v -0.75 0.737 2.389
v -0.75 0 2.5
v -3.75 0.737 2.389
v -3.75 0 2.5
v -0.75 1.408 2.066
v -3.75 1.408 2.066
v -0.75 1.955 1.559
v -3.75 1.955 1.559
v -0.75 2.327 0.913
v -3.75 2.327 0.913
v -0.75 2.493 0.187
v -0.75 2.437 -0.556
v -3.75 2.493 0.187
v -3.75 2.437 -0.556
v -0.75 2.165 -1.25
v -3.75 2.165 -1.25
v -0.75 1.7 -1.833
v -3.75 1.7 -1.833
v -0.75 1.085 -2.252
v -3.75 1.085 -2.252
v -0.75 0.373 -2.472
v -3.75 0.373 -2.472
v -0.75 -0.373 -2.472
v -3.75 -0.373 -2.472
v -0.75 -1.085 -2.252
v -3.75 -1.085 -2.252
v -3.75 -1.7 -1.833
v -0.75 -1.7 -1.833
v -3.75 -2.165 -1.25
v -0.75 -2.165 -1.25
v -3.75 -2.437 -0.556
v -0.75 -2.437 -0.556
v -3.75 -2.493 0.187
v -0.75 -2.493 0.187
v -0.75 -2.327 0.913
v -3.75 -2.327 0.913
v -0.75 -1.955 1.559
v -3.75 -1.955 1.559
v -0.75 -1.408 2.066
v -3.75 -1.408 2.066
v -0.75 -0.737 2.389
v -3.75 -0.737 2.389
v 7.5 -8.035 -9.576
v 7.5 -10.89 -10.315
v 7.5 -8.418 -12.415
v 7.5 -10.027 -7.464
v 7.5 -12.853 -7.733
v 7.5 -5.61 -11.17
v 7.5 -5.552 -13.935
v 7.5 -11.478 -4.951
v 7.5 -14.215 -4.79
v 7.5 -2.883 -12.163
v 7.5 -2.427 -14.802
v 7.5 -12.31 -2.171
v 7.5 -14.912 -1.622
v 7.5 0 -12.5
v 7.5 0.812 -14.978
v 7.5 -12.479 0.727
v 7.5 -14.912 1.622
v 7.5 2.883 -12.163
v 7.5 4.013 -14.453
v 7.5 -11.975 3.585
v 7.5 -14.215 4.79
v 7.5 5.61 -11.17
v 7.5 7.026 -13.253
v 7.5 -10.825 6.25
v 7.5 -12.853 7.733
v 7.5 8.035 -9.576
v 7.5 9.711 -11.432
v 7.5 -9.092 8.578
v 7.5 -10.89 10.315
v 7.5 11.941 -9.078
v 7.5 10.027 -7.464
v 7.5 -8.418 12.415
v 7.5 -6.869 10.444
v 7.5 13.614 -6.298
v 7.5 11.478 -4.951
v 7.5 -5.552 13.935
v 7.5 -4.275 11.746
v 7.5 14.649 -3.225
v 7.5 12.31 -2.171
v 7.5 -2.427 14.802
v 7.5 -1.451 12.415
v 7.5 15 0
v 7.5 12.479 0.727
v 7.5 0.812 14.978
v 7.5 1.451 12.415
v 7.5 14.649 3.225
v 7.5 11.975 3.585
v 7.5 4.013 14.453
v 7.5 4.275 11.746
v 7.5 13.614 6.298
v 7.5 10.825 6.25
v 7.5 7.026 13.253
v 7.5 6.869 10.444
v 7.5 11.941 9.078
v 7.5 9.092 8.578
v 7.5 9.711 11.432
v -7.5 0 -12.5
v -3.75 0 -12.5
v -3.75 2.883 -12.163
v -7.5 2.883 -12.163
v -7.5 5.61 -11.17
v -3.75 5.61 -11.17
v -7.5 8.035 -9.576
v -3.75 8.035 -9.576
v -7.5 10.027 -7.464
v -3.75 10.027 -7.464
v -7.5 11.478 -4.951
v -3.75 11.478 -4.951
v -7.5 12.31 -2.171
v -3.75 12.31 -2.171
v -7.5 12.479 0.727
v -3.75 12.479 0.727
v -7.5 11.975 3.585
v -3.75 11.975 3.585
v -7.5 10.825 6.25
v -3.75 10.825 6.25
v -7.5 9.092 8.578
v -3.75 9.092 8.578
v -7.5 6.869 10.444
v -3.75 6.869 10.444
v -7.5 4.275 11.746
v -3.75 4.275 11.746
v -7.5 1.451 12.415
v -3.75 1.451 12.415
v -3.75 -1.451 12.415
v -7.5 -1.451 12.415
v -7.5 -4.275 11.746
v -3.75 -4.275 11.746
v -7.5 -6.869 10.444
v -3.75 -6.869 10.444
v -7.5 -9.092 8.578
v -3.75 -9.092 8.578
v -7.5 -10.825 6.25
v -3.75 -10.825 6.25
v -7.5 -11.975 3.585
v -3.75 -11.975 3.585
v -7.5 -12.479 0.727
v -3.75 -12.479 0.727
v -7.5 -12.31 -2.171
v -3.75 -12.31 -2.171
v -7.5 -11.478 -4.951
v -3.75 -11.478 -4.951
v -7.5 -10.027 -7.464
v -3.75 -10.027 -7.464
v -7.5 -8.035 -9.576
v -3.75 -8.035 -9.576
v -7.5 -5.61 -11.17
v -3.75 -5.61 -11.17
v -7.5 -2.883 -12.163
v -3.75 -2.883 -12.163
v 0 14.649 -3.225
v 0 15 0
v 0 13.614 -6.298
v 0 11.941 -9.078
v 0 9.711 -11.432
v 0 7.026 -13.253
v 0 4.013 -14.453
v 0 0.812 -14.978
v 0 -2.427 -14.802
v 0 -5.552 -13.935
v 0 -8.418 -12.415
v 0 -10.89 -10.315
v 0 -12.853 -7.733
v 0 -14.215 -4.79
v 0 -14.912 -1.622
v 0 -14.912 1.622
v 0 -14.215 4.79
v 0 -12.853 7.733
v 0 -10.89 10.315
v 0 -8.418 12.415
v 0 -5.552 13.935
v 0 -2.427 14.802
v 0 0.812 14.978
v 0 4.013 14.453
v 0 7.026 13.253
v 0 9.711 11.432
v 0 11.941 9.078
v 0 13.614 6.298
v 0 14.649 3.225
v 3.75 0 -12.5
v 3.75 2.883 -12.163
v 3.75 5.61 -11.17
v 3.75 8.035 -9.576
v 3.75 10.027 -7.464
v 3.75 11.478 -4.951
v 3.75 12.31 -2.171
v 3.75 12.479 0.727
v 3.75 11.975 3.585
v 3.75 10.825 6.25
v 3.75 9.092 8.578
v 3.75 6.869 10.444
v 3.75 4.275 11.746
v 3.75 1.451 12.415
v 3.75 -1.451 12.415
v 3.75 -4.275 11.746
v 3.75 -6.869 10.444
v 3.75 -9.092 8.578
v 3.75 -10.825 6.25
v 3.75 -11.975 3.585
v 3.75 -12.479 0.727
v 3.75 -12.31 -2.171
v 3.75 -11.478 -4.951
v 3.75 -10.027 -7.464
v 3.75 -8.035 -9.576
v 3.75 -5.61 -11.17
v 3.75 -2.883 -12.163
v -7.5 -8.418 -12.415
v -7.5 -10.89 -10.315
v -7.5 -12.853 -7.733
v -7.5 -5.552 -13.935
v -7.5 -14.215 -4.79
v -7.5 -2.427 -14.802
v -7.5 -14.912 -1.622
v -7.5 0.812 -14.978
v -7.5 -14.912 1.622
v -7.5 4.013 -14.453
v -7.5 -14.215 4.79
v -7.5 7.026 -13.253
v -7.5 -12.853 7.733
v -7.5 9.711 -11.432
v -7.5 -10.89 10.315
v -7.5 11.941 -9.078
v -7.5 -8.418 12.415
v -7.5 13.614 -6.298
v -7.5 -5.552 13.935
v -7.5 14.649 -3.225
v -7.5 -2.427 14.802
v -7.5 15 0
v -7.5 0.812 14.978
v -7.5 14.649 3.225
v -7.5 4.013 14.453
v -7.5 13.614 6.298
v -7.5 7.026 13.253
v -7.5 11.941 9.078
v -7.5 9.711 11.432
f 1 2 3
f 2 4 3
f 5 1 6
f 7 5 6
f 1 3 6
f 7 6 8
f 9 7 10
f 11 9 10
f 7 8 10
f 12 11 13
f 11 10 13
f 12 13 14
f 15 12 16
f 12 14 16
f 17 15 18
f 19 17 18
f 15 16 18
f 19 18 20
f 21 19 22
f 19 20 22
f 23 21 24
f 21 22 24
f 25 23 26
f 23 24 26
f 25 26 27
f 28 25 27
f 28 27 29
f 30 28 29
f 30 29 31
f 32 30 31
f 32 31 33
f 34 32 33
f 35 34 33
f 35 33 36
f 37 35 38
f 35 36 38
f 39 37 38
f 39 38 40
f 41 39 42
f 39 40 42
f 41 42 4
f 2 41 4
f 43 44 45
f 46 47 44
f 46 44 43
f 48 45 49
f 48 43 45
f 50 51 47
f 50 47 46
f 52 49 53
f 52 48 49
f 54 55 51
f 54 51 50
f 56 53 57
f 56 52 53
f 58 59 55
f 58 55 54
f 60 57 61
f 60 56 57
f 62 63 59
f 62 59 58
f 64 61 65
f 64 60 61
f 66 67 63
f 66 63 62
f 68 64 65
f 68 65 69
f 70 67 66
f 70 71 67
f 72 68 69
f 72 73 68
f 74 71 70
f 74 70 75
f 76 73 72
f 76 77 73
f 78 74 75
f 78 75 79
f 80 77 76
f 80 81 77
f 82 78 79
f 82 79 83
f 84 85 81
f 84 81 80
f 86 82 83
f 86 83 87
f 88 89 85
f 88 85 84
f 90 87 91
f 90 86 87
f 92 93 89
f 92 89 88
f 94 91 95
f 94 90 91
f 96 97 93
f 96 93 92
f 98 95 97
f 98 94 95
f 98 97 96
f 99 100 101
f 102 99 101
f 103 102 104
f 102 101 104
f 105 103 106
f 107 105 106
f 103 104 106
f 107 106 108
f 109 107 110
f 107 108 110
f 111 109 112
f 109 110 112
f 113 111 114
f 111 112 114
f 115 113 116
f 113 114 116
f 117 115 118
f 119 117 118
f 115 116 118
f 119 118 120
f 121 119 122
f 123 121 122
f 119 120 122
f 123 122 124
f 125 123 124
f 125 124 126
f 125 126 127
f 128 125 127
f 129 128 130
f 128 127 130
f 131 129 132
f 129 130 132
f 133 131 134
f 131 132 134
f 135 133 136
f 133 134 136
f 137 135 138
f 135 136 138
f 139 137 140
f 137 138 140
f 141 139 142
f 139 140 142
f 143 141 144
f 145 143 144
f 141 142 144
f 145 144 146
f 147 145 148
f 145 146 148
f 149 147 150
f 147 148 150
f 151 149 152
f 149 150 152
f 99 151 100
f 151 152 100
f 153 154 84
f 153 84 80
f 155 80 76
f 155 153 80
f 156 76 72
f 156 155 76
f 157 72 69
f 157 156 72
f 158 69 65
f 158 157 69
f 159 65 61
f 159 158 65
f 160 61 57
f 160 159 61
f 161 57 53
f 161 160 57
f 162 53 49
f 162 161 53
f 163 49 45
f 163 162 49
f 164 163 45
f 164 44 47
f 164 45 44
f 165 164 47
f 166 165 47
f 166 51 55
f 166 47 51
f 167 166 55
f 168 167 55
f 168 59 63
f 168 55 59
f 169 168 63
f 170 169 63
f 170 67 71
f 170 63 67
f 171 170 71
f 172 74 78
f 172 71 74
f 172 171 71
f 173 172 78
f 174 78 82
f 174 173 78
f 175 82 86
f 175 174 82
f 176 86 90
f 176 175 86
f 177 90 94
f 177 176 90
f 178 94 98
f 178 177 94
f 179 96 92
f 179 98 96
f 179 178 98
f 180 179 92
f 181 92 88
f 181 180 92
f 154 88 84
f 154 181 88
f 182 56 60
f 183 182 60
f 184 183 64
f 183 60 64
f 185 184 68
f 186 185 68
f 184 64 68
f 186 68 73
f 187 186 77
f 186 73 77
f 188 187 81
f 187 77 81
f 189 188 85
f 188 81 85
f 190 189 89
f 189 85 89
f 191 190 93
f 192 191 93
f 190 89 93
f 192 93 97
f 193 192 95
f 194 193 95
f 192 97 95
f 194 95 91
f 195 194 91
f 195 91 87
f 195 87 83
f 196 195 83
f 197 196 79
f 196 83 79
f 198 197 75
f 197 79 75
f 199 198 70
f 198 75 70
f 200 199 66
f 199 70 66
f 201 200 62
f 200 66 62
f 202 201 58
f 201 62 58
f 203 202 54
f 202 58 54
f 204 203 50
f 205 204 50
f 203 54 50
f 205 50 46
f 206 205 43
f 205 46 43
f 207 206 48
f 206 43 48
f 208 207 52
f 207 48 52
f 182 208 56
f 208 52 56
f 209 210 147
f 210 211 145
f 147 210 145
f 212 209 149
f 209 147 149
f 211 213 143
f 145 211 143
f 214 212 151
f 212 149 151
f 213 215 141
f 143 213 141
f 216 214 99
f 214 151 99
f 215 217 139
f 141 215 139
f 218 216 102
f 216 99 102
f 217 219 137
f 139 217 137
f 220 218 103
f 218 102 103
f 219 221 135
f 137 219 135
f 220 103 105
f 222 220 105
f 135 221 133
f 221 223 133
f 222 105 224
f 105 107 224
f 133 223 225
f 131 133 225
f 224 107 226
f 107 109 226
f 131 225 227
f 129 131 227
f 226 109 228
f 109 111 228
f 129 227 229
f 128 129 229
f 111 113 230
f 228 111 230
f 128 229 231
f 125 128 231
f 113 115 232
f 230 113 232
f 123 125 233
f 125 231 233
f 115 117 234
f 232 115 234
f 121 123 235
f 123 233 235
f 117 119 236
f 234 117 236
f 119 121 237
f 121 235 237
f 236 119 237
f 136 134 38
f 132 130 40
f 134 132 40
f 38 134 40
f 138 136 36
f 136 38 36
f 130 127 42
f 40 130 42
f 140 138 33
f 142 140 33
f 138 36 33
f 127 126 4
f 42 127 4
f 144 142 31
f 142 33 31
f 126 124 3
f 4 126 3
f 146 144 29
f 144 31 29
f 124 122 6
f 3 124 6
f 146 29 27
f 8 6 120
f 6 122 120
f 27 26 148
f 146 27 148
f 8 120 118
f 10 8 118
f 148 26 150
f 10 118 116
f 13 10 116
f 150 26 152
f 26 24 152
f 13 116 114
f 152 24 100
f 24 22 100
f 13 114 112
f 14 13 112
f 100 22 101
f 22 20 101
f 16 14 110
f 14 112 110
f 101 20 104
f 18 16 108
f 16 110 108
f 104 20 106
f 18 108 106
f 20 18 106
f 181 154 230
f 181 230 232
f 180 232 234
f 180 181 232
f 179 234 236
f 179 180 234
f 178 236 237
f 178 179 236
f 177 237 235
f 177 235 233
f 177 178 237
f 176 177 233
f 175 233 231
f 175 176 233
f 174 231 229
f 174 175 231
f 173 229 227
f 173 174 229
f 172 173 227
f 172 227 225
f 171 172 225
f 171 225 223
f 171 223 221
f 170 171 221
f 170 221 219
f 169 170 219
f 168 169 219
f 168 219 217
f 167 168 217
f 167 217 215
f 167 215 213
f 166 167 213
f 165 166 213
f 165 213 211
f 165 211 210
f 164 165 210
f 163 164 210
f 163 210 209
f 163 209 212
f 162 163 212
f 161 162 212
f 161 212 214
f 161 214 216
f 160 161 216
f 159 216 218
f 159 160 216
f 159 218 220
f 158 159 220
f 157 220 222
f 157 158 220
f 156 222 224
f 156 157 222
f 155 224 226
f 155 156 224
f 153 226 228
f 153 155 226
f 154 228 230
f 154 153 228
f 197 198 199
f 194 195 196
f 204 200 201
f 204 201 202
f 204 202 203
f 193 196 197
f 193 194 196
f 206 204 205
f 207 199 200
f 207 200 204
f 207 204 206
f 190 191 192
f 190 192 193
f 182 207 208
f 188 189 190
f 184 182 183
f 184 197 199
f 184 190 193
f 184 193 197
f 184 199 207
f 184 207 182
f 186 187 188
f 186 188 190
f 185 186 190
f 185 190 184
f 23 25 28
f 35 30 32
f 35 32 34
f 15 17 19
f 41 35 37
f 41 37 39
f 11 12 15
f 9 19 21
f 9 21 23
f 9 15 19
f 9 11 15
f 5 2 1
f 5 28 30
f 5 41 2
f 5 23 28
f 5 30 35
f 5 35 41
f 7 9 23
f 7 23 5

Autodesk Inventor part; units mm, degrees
ref_plane "YZ Plane" through (0, 0, 0) normal (1, 0, 0) x (0, 1, 0)
ref_plane "XZ Plane" through (0, 0, 0) normal (0, 1, 0) x (-1, 0, 0)
ref_plane "XY Plane" through (0, 0, 0) normal (0, 0, 1) x (1, 0, 0)
sketch "Esboço1" plane through (0, 0, 0) normal (1, 0, 0) x (0, 1, 0)
  circle A0 centre (0, 0) radius 15
  dimension "d0" = 30
extrude "Extrusão1" add sketch "Esboço1" along normal mid plane 15
sketch "Esboço2" plane through (7.5, 0, 0) normal (1, 0, 0) x (0, 0, -1)
  circle A0 centre (0, 0) radius 12.5
  dimension "d3" = 25
extrude "Extrusão2" cut sketch "Esboço2" along normal through all both and the other way through all
ref_plane "Plano de trabalho1" through (0, 0, 0) normal (1, 0, 0) x (0, 0, -1)
sketch "Esboço3" plane through (0, 0, 0) normal (1, 0, 0) x (0, 0, -1)
  circle A0 centre (0, 0) radius 13.75
  dimension "d6" = 27.5
extrude "Extrusão3" add sketch "Esboço3" along normal mid plane 7.5
sketch "Esboço4" plane through (-3.75, 0, 0) normal (-1, 0, 0) x (0, 0, 1)
  circle A0 centre (0, 0) radius 2.5
  dimension "d9" = 5
extrude "Extrusão4" cut sketch "Esboço4" against normal blind 3
properties part number "RodaG" material "Borracha"
